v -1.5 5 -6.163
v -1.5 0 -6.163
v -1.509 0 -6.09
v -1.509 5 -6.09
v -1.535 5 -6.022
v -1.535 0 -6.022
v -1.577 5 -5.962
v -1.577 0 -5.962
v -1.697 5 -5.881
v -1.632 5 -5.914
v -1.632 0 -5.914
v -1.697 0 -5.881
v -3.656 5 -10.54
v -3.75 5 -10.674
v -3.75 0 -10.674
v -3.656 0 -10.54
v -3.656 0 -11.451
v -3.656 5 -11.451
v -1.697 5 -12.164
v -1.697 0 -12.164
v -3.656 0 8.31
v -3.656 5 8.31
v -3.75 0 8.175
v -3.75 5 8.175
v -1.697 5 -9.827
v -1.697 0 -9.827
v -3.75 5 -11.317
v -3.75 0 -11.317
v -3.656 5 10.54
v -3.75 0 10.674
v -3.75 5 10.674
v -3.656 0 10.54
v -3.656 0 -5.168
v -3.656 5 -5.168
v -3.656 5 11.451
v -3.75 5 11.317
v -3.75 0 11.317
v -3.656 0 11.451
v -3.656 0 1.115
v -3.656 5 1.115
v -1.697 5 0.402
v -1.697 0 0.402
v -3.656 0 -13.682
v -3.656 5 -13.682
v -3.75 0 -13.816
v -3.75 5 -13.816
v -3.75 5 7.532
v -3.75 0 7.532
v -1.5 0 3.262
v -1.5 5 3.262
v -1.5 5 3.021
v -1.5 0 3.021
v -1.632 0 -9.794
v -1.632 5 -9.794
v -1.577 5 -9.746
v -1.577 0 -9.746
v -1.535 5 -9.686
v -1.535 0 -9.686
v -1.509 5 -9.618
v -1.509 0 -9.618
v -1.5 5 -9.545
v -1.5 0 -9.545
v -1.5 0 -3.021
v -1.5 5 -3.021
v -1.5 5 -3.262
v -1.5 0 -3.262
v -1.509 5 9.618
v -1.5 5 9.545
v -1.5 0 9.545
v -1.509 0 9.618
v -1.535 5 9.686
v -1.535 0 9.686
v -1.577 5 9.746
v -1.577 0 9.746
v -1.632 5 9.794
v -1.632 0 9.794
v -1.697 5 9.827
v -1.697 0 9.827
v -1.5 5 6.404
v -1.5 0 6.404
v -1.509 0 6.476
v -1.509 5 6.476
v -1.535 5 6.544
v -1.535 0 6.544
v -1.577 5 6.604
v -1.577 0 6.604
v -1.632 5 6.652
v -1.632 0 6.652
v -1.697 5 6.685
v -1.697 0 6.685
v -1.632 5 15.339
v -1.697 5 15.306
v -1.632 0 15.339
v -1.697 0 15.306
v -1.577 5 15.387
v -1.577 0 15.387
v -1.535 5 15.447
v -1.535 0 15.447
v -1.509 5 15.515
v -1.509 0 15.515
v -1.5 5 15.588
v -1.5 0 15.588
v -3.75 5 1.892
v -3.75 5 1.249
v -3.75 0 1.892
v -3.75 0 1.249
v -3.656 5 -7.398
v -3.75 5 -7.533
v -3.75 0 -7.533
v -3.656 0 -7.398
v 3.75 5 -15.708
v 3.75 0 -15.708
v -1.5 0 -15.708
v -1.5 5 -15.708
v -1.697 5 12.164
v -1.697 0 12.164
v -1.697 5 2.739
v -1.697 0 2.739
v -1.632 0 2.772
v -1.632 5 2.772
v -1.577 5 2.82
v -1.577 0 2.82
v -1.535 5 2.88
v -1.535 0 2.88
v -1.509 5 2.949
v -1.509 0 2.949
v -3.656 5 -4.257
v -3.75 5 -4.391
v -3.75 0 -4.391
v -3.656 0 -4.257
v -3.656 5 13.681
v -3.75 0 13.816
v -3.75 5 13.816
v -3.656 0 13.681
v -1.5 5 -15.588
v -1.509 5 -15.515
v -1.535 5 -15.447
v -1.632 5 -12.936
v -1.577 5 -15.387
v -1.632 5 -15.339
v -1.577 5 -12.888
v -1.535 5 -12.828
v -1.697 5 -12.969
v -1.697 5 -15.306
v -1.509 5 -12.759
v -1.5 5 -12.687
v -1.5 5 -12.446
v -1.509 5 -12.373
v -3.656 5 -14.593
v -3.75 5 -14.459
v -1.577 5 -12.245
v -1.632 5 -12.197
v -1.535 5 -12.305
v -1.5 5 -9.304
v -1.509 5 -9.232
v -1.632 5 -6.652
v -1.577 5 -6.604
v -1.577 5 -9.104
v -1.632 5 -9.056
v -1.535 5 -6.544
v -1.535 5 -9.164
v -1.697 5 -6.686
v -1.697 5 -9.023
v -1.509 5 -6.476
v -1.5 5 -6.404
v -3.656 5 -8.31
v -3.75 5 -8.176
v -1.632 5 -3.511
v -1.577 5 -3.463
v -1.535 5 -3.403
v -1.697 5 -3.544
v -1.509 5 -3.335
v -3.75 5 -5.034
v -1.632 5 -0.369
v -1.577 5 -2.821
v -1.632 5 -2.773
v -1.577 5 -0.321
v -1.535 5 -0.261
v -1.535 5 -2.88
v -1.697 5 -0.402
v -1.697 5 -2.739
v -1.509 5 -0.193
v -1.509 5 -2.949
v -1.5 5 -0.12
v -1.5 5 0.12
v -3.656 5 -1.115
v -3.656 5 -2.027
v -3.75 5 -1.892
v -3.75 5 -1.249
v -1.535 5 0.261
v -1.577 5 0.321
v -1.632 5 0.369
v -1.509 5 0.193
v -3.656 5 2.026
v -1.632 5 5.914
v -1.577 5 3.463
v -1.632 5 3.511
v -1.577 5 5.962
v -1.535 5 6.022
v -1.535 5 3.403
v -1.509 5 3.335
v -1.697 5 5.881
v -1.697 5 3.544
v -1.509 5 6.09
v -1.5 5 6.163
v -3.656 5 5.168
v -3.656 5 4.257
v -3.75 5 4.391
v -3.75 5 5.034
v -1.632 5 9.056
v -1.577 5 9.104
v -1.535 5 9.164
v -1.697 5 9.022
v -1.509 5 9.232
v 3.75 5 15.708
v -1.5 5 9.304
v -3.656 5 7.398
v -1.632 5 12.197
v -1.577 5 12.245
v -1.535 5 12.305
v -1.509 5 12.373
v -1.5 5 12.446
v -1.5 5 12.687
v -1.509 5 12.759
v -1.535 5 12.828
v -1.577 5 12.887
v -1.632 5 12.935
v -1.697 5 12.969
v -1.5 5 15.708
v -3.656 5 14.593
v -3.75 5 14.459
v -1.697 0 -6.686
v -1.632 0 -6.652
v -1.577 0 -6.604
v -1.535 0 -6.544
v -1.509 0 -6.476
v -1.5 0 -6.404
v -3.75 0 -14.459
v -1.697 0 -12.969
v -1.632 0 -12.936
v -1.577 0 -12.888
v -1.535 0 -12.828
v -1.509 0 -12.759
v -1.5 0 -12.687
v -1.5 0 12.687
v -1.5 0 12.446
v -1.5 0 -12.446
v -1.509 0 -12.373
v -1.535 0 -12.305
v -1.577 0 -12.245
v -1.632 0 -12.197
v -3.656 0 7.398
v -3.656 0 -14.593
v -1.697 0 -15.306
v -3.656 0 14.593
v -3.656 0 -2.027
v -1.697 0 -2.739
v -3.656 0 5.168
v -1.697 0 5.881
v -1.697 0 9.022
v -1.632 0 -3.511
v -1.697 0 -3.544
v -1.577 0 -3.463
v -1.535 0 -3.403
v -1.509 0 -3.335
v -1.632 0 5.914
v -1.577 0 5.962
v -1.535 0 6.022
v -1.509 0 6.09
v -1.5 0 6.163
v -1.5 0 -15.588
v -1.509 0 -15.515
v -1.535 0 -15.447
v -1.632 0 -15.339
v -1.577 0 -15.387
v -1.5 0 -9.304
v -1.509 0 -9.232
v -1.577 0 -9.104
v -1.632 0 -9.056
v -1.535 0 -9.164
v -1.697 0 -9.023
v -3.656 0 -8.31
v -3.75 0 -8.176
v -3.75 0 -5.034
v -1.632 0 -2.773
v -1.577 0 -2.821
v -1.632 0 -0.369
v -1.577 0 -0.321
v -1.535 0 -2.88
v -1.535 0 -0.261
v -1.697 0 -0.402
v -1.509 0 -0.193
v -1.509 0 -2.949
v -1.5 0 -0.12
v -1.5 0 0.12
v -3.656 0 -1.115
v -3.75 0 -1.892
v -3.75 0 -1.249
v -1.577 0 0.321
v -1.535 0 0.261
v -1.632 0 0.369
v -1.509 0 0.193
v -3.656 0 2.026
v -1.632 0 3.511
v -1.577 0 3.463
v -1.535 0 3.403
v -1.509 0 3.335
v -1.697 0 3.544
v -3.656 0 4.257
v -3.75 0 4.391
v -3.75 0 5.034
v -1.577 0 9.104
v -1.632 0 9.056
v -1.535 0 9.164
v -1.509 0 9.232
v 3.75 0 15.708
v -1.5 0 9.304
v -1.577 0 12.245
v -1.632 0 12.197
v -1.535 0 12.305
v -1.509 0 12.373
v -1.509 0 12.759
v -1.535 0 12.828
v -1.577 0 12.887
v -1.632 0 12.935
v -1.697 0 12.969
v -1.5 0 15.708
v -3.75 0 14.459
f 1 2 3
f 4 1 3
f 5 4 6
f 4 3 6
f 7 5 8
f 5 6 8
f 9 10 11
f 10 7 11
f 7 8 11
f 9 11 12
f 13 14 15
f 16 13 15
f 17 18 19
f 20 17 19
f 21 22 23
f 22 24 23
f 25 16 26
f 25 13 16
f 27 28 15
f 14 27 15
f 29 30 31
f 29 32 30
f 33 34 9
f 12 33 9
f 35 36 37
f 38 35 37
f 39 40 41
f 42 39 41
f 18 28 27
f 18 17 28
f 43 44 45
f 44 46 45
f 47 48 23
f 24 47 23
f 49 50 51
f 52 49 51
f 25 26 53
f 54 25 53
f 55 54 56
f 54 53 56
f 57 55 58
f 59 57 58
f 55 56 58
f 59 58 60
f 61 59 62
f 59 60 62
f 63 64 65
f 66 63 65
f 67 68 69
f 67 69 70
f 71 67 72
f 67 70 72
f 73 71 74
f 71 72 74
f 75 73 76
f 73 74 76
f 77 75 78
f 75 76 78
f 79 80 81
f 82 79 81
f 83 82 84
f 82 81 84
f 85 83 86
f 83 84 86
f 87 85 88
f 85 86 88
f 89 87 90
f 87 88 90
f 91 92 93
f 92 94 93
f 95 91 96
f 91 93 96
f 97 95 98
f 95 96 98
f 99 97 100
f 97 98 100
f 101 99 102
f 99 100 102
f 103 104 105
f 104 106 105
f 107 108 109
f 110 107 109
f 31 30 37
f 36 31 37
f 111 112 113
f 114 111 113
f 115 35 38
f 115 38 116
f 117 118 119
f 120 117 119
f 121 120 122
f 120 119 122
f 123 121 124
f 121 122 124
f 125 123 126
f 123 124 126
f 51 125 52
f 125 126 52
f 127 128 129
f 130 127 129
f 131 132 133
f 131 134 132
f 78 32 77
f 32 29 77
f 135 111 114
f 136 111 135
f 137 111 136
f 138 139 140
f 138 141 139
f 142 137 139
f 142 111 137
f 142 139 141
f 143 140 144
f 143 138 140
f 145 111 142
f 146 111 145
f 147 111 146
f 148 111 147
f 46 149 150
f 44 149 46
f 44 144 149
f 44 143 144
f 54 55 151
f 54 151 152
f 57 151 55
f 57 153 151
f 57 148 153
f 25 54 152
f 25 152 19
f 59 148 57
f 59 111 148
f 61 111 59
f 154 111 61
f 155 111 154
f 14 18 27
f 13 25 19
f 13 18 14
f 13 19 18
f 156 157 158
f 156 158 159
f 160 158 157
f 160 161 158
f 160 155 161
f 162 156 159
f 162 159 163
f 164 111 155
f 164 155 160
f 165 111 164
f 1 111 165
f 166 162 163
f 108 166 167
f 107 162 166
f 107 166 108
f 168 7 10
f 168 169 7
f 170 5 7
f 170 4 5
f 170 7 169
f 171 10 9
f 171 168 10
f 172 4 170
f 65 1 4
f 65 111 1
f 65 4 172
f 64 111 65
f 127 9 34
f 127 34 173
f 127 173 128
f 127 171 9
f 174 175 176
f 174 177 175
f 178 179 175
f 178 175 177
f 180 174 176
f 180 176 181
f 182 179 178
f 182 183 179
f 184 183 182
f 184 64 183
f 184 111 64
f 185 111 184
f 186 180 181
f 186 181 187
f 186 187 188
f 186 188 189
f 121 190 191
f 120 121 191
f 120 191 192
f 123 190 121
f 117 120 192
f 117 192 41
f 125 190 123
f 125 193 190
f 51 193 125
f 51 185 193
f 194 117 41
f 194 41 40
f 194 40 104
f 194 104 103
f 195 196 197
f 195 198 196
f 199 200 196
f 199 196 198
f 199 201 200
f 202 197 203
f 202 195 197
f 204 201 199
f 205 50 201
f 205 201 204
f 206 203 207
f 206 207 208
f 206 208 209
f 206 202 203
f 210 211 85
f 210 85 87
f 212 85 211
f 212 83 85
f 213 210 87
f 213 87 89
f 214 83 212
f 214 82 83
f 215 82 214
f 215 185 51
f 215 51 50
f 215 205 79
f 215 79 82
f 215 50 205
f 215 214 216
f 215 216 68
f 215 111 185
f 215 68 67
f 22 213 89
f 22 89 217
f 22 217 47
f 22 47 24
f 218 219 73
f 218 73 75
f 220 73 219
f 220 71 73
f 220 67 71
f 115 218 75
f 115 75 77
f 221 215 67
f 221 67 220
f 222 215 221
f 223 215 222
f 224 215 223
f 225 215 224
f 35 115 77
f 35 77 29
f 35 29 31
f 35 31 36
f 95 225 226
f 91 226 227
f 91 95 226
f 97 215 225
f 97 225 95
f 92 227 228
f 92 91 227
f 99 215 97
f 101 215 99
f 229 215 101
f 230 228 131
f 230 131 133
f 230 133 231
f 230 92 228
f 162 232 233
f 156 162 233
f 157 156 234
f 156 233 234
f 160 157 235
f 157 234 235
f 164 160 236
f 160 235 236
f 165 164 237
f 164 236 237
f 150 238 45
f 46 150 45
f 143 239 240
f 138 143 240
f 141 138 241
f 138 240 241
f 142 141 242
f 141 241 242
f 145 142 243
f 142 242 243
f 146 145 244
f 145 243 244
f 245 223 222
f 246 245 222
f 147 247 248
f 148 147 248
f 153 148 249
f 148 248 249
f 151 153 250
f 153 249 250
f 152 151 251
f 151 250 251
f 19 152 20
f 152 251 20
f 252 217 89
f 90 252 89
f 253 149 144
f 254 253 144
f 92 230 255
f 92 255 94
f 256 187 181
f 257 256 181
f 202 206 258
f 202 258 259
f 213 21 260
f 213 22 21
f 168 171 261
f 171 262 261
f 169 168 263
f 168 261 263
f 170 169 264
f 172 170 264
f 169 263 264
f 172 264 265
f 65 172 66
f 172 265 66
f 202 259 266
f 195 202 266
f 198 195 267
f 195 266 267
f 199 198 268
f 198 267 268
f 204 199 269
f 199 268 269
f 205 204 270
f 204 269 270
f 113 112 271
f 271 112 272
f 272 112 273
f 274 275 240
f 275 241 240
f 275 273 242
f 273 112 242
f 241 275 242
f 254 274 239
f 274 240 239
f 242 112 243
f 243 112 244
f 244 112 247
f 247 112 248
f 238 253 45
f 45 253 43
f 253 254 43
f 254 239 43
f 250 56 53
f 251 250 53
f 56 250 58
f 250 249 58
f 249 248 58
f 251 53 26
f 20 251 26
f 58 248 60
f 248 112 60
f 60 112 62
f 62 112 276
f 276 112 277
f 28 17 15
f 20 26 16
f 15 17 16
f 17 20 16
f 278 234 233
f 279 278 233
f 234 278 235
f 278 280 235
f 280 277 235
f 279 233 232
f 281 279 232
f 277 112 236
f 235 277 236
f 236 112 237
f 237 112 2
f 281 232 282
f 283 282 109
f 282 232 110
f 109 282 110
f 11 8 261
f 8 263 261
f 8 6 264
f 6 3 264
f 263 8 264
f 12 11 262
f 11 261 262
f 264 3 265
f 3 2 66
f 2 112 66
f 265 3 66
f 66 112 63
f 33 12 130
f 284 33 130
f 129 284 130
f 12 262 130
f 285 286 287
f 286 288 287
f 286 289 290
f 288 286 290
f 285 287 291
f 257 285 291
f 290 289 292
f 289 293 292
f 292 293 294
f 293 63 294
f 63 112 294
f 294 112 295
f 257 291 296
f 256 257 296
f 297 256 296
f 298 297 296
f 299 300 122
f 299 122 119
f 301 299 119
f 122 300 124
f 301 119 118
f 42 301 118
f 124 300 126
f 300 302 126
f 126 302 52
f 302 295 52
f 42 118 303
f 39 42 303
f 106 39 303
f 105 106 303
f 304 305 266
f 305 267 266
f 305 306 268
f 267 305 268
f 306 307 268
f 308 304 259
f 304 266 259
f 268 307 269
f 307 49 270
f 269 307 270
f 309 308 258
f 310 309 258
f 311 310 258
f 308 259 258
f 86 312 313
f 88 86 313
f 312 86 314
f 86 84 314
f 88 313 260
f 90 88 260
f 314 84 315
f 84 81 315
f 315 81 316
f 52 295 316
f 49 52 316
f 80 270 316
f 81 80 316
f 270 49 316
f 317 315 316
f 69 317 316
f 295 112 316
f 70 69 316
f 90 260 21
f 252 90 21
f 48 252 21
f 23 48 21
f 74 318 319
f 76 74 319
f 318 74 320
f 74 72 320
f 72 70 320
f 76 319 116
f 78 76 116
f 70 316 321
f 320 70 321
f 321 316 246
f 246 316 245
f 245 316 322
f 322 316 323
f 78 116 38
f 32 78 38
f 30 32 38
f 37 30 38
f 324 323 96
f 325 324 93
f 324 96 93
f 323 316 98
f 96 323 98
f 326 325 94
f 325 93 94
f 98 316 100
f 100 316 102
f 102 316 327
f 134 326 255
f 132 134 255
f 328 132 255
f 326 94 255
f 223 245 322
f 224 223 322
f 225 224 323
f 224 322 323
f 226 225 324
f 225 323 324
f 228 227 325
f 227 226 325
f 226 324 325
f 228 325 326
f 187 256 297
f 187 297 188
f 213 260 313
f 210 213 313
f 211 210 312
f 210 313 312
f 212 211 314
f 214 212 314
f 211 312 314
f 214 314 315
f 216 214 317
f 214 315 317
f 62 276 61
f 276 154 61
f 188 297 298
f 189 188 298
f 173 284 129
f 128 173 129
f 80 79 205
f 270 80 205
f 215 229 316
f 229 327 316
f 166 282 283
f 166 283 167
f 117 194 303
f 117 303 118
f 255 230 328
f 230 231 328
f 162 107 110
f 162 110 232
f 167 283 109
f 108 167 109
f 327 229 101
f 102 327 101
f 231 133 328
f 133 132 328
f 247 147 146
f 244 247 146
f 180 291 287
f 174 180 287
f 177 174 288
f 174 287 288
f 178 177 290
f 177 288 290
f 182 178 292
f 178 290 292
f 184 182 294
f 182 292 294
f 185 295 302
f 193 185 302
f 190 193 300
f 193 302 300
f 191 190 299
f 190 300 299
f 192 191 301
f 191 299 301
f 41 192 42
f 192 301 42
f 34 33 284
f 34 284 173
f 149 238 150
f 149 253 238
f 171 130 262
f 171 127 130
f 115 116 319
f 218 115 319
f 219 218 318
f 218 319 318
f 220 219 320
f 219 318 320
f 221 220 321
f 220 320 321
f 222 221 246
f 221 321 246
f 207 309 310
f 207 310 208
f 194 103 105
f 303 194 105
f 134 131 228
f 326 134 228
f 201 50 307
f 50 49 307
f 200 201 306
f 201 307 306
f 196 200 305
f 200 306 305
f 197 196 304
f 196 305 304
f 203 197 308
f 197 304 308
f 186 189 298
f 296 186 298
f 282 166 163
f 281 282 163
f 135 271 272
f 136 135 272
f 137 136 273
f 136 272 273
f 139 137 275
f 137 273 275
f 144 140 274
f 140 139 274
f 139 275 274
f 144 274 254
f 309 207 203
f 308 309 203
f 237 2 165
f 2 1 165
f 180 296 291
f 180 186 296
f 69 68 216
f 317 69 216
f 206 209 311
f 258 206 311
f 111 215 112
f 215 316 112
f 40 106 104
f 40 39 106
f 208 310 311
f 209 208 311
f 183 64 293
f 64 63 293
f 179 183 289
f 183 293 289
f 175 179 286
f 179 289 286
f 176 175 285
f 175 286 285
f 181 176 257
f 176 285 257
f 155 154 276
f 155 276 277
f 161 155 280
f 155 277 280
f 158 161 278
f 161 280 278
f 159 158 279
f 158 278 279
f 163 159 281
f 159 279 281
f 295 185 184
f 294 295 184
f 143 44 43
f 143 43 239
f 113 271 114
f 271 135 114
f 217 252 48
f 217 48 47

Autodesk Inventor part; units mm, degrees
ref_plane "YZ Plane" through (0, 0, 0) normal (1, 0, 0) x (0, 1, 0)
ref_plane "XZ Plane" through (0, 0, 0) normal (0, 1, 0) x (-1, 0, 0)
ref_plane "XY Plane" through (0, 0, 0) normal (0, 0, 1) x (1, 0, 0)
sketch "スケッチ1" plane through (0, 0, 0) normal (0, 1, 0) x (-1, 0, 0)
  point P0 (0, 0)
  point P1 (4.6985, 0)
  point P2 (6.4922, 1.415)
sketch "スケッチ2" plane through (0, 0, 0) normal (0, 1, 0) x (-1, 0, 0)
  line L0 (3.75, 15.708) -> (-3.75, 15.708)
  line L1 (-3.75, 15.708) -> (-3.75, -15.708)
  line L2 (-3.75, -15.708) -> (3.75, -15.708)
  line L3 (3.75, -15.708) -> (3.75, 15.708)
  line L4 (3.75, 15.708) -> (-3.75, -15.708)
  line L5 (3.75, -15.708) -> (-3.75, 15.708)
  point P0 (0, 0)
  point P1 (0.0816, -5.789)
  point P2 (0, 0)
  dimension "d2" = 7.5
  dimension "d3" = 31.4159
extrude "押し出し1" add sketch "スケッチ2" along normal blind 5
ref_plane "作業平面1" through (0, 5, 0) normal (0, 1, 0) x (1, 0, 0)
sketch "スケッチ3" plane through (0, 5, 0) normal (0, 1, 0) x (1, 0, 0)
  line L0 (-3.75, 15.708) -> (-3.75, -15.708) projected
  line L1 (-3.75, -12.5664) -> (3.75, -12.5664)
  line L2 (3.75, -15.708) -> (3.75, 15.708) projected
  line L3 (-3.75, -15.708) -> (3.75, -15.708) projected
  line L4 (-3.75, -14.1372) -> (3.75, -14.1372)
  line L5 (-2.75, -15.708) -> (-2.75, -12.5664)
  line L6 (-1.5, -15.708) -> (-1.5, -12.5664)
  line L7 (-3.75, -14.5586) -> (-1.5, -15.3775)
  line L8 (-3.75, -14.5586) -> (-1.3556, -14.5586) construction
  line L9 (-3.75, -13.7157) -> (-1.5, -12.8968)
  line L10 (-3.75, -13.7157) -> (-1.3556, -13.7157) construction
  point P0 (0, 0)
  point P1 (-2.75, -14.9226)
  point P2 (-2.75, -13.3518)
  dimension "d8" = 1.5708
  dimension "d9" = 1.5708
  dimension "d10" = 1
  dimension "d11" = 1.25
  dimension "d12" = 0.7854
  dimension "d13" = 0.7854
  dimension "d14" = 20
  dimension "d15" = 20
extrude "押し出し2" cut sketch "スケッチ3" against normal blind 5 contours L1 L5 L9 L0 | L1 L6 L9 L5 | L7 L5 L3 L0 | L7 L6 L3 L5
fillet "フィレット1" radius 0.3 2 edges at (-1.5, 2.5, 12.8968) (-1.5, 2.5, 15.3775)
chamfer "面取り1" distance 0.1 angle 45 2 edges at (-3.75, 2.5, 14.5586) (-3.75, 2.5, 13.7157)
pattern_linear "矩形状パターン1" count 10 spacing 3.1416 along (0, 0, -1) of "押し出し2", "面取り1", "フィレット1"
equation "\"module\" = 1"
properties part number "lack1"
